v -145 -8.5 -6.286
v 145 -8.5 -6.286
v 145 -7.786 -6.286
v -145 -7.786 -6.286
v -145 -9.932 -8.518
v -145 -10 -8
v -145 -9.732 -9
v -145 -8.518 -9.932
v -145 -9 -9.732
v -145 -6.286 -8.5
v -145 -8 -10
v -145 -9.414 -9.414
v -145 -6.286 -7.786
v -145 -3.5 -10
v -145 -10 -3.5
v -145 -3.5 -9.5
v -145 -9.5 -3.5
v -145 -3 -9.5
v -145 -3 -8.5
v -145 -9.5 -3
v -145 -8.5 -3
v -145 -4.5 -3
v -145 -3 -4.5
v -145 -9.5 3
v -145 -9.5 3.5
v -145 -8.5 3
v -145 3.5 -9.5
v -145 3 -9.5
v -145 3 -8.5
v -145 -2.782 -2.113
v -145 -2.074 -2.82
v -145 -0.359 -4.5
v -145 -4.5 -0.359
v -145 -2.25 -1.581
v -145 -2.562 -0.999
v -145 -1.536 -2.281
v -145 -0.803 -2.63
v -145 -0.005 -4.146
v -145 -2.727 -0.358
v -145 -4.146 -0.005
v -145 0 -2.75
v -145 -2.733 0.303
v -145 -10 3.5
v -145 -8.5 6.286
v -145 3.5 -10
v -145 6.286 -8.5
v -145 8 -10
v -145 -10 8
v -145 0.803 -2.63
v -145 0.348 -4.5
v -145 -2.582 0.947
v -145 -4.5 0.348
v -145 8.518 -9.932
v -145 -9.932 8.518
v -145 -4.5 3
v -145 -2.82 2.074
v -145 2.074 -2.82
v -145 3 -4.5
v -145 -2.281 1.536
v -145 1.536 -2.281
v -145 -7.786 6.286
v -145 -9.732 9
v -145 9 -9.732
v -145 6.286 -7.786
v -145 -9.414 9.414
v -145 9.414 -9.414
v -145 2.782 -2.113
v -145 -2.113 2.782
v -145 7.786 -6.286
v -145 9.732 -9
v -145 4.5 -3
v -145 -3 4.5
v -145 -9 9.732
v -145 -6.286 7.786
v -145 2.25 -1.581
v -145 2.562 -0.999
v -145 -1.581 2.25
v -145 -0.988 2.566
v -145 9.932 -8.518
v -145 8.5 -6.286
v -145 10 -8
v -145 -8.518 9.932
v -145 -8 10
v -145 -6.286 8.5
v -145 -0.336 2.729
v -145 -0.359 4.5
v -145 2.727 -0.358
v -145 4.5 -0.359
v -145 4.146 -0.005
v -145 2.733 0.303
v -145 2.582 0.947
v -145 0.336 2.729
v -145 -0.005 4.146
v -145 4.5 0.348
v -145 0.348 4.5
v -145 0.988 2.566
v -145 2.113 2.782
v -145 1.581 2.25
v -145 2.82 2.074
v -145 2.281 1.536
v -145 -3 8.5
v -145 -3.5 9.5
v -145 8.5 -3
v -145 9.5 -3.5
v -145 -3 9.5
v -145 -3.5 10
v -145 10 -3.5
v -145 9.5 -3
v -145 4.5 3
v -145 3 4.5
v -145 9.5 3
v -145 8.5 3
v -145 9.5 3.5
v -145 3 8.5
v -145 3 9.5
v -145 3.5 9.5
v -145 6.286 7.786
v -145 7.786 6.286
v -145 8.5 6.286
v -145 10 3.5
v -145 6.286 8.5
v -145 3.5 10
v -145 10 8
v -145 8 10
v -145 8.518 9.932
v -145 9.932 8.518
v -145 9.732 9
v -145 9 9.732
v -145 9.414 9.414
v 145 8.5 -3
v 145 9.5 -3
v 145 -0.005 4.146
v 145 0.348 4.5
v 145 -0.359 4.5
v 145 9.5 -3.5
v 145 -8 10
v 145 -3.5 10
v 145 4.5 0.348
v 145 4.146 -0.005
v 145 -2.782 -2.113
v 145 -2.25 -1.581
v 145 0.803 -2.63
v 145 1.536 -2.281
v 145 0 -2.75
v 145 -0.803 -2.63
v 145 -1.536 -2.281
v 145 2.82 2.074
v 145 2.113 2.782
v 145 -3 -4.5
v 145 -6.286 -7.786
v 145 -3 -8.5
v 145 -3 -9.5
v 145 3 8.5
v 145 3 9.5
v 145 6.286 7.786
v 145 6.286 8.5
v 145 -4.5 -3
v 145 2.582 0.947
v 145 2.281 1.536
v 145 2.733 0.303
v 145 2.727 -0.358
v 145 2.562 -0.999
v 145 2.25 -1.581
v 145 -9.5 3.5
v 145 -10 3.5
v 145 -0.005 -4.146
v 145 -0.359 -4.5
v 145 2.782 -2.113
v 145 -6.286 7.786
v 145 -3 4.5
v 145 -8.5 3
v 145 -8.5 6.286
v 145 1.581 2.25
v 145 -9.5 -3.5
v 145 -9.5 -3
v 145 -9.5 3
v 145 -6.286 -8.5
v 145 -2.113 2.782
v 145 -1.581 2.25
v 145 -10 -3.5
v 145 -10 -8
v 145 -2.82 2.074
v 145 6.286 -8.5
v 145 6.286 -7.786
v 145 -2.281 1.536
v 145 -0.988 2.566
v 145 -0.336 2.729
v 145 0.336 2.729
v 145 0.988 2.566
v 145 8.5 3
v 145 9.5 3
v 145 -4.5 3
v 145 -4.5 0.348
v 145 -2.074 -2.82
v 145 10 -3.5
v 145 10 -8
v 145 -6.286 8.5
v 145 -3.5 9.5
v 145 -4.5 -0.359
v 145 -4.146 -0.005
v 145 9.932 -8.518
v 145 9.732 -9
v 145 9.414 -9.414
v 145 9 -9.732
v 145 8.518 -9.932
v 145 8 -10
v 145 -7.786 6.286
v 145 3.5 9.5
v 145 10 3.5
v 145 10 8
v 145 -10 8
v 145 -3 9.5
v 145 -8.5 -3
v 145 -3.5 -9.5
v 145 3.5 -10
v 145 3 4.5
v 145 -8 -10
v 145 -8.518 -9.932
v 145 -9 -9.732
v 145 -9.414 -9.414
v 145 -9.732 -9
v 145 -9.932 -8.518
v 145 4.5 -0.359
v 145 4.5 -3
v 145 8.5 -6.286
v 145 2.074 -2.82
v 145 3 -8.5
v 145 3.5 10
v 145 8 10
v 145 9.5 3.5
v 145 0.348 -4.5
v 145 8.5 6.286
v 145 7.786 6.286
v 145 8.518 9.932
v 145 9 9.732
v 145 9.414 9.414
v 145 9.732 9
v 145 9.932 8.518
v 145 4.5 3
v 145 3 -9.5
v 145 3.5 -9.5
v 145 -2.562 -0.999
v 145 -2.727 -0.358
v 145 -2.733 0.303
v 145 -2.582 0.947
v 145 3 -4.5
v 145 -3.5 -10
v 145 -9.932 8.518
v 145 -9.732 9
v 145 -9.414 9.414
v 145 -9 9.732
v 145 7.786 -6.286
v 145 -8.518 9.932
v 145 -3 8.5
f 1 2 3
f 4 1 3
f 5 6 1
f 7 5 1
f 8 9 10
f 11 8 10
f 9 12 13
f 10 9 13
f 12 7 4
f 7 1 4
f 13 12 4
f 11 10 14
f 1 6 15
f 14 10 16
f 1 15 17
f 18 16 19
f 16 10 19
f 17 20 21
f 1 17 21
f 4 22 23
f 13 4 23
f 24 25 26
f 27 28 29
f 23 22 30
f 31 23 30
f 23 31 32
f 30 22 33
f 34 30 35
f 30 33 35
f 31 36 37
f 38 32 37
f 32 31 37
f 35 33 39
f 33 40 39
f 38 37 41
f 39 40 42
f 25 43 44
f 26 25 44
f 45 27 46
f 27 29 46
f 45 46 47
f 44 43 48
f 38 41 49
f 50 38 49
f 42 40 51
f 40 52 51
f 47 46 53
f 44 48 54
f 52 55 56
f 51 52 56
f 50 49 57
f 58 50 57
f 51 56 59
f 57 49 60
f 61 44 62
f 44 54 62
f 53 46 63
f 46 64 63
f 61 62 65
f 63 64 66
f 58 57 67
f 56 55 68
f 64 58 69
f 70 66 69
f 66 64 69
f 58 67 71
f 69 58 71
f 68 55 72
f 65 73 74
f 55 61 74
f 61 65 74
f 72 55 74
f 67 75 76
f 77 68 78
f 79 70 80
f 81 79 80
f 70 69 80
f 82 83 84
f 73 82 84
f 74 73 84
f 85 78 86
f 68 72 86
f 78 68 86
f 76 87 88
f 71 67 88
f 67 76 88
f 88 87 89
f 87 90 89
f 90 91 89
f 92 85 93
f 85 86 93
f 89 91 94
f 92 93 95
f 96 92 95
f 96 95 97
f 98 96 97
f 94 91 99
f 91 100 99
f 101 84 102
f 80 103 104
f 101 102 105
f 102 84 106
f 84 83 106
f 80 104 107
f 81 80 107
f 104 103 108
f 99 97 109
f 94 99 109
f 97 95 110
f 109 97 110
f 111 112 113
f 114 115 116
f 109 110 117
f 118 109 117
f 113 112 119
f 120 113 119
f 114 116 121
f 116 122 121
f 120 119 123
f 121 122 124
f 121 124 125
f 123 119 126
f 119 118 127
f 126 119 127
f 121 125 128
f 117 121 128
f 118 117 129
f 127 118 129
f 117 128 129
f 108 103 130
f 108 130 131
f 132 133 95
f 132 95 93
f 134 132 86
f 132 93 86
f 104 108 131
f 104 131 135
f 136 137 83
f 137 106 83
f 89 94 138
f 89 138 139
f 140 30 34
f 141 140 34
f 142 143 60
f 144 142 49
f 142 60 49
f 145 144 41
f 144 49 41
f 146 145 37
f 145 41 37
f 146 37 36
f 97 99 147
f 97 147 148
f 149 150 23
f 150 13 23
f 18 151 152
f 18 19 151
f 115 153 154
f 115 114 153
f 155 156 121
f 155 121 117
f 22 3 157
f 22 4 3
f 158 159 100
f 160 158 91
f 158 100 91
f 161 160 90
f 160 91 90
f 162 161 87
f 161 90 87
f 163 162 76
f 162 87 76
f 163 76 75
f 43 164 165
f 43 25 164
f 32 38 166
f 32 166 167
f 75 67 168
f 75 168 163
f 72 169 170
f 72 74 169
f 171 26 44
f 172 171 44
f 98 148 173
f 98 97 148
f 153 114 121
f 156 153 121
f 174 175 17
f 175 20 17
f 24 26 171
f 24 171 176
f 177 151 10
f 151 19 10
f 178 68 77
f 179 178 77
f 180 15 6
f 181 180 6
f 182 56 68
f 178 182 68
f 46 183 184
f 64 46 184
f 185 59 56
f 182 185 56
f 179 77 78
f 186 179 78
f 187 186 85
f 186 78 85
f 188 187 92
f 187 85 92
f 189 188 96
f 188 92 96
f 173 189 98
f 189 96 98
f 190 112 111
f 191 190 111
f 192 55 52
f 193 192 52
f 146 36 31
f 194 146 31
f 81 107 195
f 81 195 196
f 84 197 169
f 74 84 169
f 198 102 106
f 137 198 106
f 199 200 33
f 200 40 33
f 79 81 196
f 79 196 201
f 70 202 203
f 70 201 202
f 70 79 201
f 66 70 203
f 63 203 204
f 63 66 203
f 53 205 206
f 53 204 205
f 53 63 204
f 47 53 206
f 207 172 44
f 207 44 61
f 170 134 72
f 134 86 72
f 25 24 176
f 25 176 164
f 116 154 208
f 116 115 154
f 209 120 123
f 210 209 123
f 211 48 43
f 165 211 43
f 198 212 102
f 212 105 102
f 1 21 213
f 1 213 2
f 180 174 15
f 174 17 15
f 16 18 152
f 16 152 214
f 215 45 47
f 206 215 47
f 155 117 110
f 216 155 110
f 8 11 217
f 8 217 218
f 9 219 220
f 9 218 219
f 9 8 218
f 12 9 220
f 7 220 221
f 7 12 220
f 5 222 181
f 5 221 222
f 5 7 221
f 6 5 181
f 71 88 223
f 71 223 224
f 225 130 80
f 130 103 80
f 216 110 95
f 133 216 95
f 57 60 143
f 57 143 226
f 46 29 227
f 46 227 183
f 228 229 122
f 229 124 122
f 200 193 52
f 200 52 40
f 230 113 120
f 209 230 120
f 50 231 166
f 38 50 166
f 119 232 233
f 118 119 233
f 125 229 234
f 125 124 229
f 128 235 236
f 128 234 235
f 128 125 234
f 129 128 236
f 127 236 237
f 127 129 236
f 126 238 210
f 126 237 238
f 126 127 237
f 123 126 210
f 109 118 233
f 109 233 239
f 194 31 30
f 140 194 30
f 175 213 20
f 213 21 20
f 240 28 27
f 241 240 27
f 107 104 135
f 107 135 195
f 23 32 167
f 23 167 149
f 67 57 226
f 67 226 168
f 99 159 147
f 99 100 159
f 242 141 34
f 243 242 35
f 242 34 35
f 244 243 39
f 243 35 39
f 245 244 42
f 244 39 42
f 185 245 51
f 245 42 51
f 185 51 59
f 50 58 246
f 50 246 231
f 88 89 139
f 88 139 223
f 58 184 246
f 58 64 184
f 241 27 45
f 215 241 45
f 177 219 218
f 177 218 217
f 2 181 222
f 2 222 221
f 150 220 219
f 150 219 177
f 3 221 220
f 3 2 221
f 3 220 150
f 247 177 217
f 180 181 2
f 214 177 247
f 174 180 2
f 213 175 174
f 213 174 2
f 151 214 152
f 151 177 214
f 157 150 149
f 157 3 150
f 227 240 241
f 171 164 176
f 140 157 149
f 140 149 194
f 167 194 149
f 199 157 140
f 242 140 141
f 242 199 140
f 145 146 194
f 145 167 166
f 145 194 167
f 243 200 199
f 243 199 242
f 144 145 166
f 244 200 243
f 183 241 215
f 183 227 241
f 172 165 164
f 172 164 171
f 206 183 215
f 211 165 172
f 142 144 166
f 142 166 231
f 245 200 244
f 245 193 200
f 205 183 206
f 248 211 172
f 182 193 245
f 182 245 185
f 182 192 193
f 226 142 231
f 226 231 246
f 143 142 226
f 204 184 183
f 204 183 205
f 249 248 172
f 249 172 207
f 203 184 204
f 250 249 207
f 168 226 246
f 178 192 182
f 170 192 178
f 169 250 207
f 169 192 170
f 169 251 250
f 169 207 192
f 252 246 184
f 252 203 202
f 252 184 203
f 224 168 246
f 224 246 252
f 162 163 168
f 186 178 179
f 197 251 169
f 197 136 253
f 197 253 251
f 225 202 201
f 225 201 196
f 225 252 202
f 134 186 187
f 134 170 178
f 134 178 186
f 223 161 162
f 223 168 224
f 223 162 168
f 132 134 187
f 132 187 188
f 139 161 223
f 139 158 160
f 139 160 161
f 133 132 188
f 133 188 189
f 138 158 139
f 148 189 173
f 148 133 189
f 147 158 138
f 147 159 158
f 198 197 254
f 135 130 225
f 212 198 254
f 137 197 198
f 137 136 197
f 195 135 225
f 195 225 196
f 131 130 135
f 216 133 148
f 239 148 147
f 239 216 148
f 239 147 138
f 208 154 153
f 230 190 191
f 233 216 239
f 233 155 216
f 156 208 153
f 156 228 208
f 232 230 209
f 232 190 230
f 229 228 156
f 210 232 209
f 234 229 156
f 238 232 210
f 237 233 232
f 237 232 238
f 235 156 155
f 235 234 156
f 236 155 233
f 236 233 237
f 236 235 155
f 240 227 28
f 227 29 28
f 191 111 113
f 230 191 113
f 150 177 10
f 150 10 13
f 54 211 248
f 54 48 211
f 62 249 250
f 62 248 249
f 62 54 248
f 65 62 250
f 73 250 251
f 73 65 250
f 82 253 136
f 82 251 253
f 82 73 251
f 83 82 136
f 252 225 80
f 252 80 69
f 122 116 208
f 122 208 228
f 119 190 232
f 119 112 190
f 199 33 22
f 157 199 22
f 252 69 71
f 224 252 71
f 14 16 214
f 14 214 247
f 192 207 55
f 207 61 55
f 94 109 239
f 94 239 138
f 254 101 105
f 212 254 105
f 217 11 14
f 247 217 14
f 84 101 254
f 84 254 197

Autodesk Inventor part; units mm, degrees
ref_plane "YZ Plane" through (0, 0, 0) normal (1, 0, 0) x (0, 1, 0)
ref_plane "XZ Plane" through (0, 0, 0) normal (0, 1, 0) x (-1, 0, 0)
ref_plane "XY Plane" through (0, 0, 0) normal (0, 0, 1) x (1, 0, 0)
sketch "Skizze1" plane through (0, 0, 0) normal (1, 0, 0) x (0, 1, 0)
  line L0 (-14.5799, 0) -> (14.5799, 0) projected
  line L1 (0, -14.5799) -> (0, 14.5799) projected
  line L2 (9.5, 3) -> (9.5, 3.5)
  line L3 (9.5, 3.5) -> (10, 3.5)
  line L4 (8.5, 3) -> (8.5, 6.2861)
  line L5 (7.7861, 6.2861) -> (4.5, 3)
  line L6 (8.5, 6.2861) -> (7.7861, 6.2861)
  line L7 (8.5, 3) -> (9.5, 3)
  line L8 (9.5, -3) -> (9.5, -3.5)
  line L9 (9.5, -3.5) -> (10, -3.5)
  line L10 (8.5, -3) -> (8.5, -6.2861)
  line L11 (7.7861, -6.2861) -> (4.5, -3)
  line L12 (8.5, -6.2861) -> (7.7861, -6.2861)
  line L13 (8.5, -3) -> (9.5, -3)
  line L14 (10, 3.5) -> (10, 8)
  line L15 (10, -3.5) -> (10, -8)
  line L16 (-9.5, 3) -> (-9.5, 3.5)
  line L17 (-9.5, 3.5) -> (-10, 3.5)
  line L18 (-8.5, 3) -> (-8.5, 6.2861)
  line L19 (-7.7861, 6.2861) -> (-4.5, 3)
  line L20 (-8.5, 6.2861) -> (-7.7861, 6.2861)
  line L21 (-8.5, 3) -> (-9.5, 3)
  line L22 (-8.5, -3) -> (-9.5, -3)
  line L23 (-8.5, -3) -> (-8.5, -6.2861)
  line L24 (-8.5, -6.2861) -> (-7.7861, -6.2861)
  line L25 (-7.7861, -6.2861) -> (-4.5, -3)
  line L26 (-9.5, -3) -> (-9.5, -3.5)
  line L27 (-9.5, -3.5) -> (-10, -3.5)
  line L28 (3, -9.5) -> (3.5, -9.5)
  line L29 (3.5, -9.5) -> (3.5, -10)
  line L30 (3, -8.5) -> (6.2861, -8.5)
  line L31 (6.2861, -7.7861) -> (3, -4.5)
  line L32 (6.2861, -8.5) -> (6.2861, -7.7861)
  line L33 (3, -8.5) -> (3, -9.5)
  line L34 (-3, -8.5) -> (-3, -9.5)
  line L35 (-3, -8.5) -> (-6.2861, -8.5)
  line L36 (-6.2861, -8.5) -> (-6.2861, -7.7861)
  line L37 (-6.2861, -7.7861) -> (-3, -4.5)
  line L38 (-3, -9.5) -> (-3.5, -9.5)
  line L39 (-3.5, -9.5) -> (-3.5, -10)
  line L40 (3.5, 9.5) -> (3.5, 10)
  line L41 (3, 9.5) -> (3.5, 9.5)
  line L42 (3, 8.5) -> (3, 9.5)
  line L43 (3, 8.5) -> (6.2861, 8.5)
  line L44 (6.2861, 8.5) -> (6.2861, 7.7861)
  line L45 (6.2861, 7.7861) -> (3, 4.5)
  line L46 (-6.2861, 7.7861) -> (-3, 4.5)
  line L47 (-6.2861, 8.5) -> (-6.2861, 7.7861)
  line L48 (-3, 8.5) -> (-6.2861, 8.5)
  line L49 (-3, 8.5) -> (-3, 9.5)
  line L50 (-3, 9.5) -> (-3.5, 9.5)
  line L51 (-3.5, 9.5) -> (-3.5, 10)
  line L52 (8, 10) -> (3.5, 10)
  line L53 (-3.5, 10) -> (-8, 10)
  line L54 (-10, 8) -> (-10, 3.5)
  line L55 (-10, -3.5) -> (-10, -8)
  line L56 (-8, -10) -> (-3.5, -10)
  line L57 (3.5, -10) -> (8, -10)
  arc A0 (10, 8) -> (8, 10) centre (8, 8) ccw
  arc A1 (8, -10) -> (10, -8) centre (8, -8) ccw
  arc A2 (-10, -8) -> (-8, -10) centre (-8, -8) ccw
  arc A3 (-8, 10) -> (-10, 8) centre (-8, 8) ccw
  line L58 (-2.8201, 2.0744) -> (-2.113, 2.7815)
  line L59 (-2.113, 2.7815) -> (-1.5814, 2.2498)
  line L60 (-2.2813, 1.5356) -> (-2.8201, 2.0744)
  line L61 (2.8201, 2.0744) -> (2.113, 2.7815)
  line L62 (2.113, 2.7815) -> (1.5814, 2.2498)
  line L63 (2.2813, 1.5356) -> (2.8201, 2.0744)
  line L64 (2.0744, -2.8201) -> (2.7815, -2.113)
  line L65 (2.7815, -2.113) -> (2.2498, -1.5814)
  line L66 (1.5356, -2.2813) -> (2.0744, -2.8201)
  line L67 (-2.7815, -2.113) -> (-2.2498, -1.5814)
  line L68 (-2.0744, -2.8201) -> (-2.7815, -2.113)
  line L69 (-1.5356, -2.2813) -> (-2.0744, -2.8201)
  arc A4 (1.5814, 2.2498) -> (-1.5814, 2.2498) centre (0, 0) ccw
  arc A5 (1.5814, 2.2498) -> (-1.5814, 2.2498) centre (0, 0) ccw
  arc A6 (2.2498, -1.5814) -> (2.2813, 1.5356) centre (0, 0) ccw
  arc A7 (2.2498, -1.5814) -> (2.2813, 1.5356) centre (0, 0) ccw
  arc A8 (-2.2813, 1.5356) -> (-2.2498, -1.5814) centre (0, 0) ccw
  arc A9 (-1.5356, -2.2813) -> (1.5356, -2.2813) centre (0, 0) ccw
  arc A10 (-2.2813, 1.5356) -> (-2.2498, -1.5814) centre (0, 0) ccw
  arc A11 (-1.5356, -2.2813) -> (1.5356, -2.2813) centre (0, 0) ccw
  line L70 (0.3484, 4.5) -> (-0.0051, 4.1465)
  line L71 (-0.0051, 4.1465) -> (-0.3589, 4.5)
  line L72 (3, 4.5) -> (0.3484, 4.5)
  line L73 (-0.3589, 4.5) -> (-3, 4.5)
  line L74 (4.5, 0.3484) -> (4.1465, -0.0051)
  line L75 (4.1465, -0.0051) -> (4.5, -0.3589)
  line L76 (0.3484, -4.5) -> (-0.0051, -4.1465)
  line L77 (-0.0051, -4.1465) -> (-0.3589, -4.5)
  line L78 (-4.5, 0.3484) -> (-4.1465, -0.0051)
  line L79 (-4.1465, -0.0051) -> (-4.5, -0.3589)
  line L80 (4.5, 3) -> (4.5, 0.3484)
  line L81 (4.5, -0.3589) -> (4.5, -3)
  line L82 (3, -4.5) -> (0.3484, -4.5)
  line L83 (-0.3589, -4.5) -> (-3, -4.5)
  line L84 (-4.5, 3) -> (-4.5, 0.3484)
  line L85 (-4.5, -0.3589) -> (-4.5, -3)
  point P0 (-10, -10)
  point P1 (-10, 10)
  point P2 (10, -10)
  dimension "d0" = 20
  dimension "d1" = 20
  dimension "d4" = 6
  dimension "d9" = 0.5
  dimension "d10" = 0.5
  dimension "d13" = 45
  dimension "d14" = 3.2861
  dimension "d16" = 3
  dimension "d17" = 3.5
  dimension "d19" = 6
  dimension "d20" = 0.5
  dimension "d21" = 0.5
  dimension "d22" = 45
  dimension "d23" = 3.2861
  dimension "d25" = 2
extrude "Extrusion1" add sketch "Skizze1" along normal mid plane 290 contours L78 L84 L19 L20 L18 L21 L16 L17 L54 A3 L53 L51 L50 L49 L48 L47 L46 L73 L71 L70 L1 A4 L59 L58 L60 A8 L0 | L0 A8 L67 L68 L69 A9 L1 L76 L77 L83 L37 L36 L35 L34 L38 L39 L56 A2 L55 L27 L26 L22 L23 L24 L25 L85 L79 L78 | A6 L63 L61 L62 A4 L1 L70 L72 L45 L44 L43 L42 L41 L40 L52 A0 L14 L3 L2 L7 L4 L6 L5 L80 L74 L0 | L0 L74 L75 L81 L11 L12 L10 L13 L8 L9 L15 A1 L57 L29 L28 L33 L30 L32 L31 L82 L76 L1 A9 L66 L64 L65 A6
properties part number "Motedius_20x20_B-Type_Slot-6_290" material "Aluminium 6061"
